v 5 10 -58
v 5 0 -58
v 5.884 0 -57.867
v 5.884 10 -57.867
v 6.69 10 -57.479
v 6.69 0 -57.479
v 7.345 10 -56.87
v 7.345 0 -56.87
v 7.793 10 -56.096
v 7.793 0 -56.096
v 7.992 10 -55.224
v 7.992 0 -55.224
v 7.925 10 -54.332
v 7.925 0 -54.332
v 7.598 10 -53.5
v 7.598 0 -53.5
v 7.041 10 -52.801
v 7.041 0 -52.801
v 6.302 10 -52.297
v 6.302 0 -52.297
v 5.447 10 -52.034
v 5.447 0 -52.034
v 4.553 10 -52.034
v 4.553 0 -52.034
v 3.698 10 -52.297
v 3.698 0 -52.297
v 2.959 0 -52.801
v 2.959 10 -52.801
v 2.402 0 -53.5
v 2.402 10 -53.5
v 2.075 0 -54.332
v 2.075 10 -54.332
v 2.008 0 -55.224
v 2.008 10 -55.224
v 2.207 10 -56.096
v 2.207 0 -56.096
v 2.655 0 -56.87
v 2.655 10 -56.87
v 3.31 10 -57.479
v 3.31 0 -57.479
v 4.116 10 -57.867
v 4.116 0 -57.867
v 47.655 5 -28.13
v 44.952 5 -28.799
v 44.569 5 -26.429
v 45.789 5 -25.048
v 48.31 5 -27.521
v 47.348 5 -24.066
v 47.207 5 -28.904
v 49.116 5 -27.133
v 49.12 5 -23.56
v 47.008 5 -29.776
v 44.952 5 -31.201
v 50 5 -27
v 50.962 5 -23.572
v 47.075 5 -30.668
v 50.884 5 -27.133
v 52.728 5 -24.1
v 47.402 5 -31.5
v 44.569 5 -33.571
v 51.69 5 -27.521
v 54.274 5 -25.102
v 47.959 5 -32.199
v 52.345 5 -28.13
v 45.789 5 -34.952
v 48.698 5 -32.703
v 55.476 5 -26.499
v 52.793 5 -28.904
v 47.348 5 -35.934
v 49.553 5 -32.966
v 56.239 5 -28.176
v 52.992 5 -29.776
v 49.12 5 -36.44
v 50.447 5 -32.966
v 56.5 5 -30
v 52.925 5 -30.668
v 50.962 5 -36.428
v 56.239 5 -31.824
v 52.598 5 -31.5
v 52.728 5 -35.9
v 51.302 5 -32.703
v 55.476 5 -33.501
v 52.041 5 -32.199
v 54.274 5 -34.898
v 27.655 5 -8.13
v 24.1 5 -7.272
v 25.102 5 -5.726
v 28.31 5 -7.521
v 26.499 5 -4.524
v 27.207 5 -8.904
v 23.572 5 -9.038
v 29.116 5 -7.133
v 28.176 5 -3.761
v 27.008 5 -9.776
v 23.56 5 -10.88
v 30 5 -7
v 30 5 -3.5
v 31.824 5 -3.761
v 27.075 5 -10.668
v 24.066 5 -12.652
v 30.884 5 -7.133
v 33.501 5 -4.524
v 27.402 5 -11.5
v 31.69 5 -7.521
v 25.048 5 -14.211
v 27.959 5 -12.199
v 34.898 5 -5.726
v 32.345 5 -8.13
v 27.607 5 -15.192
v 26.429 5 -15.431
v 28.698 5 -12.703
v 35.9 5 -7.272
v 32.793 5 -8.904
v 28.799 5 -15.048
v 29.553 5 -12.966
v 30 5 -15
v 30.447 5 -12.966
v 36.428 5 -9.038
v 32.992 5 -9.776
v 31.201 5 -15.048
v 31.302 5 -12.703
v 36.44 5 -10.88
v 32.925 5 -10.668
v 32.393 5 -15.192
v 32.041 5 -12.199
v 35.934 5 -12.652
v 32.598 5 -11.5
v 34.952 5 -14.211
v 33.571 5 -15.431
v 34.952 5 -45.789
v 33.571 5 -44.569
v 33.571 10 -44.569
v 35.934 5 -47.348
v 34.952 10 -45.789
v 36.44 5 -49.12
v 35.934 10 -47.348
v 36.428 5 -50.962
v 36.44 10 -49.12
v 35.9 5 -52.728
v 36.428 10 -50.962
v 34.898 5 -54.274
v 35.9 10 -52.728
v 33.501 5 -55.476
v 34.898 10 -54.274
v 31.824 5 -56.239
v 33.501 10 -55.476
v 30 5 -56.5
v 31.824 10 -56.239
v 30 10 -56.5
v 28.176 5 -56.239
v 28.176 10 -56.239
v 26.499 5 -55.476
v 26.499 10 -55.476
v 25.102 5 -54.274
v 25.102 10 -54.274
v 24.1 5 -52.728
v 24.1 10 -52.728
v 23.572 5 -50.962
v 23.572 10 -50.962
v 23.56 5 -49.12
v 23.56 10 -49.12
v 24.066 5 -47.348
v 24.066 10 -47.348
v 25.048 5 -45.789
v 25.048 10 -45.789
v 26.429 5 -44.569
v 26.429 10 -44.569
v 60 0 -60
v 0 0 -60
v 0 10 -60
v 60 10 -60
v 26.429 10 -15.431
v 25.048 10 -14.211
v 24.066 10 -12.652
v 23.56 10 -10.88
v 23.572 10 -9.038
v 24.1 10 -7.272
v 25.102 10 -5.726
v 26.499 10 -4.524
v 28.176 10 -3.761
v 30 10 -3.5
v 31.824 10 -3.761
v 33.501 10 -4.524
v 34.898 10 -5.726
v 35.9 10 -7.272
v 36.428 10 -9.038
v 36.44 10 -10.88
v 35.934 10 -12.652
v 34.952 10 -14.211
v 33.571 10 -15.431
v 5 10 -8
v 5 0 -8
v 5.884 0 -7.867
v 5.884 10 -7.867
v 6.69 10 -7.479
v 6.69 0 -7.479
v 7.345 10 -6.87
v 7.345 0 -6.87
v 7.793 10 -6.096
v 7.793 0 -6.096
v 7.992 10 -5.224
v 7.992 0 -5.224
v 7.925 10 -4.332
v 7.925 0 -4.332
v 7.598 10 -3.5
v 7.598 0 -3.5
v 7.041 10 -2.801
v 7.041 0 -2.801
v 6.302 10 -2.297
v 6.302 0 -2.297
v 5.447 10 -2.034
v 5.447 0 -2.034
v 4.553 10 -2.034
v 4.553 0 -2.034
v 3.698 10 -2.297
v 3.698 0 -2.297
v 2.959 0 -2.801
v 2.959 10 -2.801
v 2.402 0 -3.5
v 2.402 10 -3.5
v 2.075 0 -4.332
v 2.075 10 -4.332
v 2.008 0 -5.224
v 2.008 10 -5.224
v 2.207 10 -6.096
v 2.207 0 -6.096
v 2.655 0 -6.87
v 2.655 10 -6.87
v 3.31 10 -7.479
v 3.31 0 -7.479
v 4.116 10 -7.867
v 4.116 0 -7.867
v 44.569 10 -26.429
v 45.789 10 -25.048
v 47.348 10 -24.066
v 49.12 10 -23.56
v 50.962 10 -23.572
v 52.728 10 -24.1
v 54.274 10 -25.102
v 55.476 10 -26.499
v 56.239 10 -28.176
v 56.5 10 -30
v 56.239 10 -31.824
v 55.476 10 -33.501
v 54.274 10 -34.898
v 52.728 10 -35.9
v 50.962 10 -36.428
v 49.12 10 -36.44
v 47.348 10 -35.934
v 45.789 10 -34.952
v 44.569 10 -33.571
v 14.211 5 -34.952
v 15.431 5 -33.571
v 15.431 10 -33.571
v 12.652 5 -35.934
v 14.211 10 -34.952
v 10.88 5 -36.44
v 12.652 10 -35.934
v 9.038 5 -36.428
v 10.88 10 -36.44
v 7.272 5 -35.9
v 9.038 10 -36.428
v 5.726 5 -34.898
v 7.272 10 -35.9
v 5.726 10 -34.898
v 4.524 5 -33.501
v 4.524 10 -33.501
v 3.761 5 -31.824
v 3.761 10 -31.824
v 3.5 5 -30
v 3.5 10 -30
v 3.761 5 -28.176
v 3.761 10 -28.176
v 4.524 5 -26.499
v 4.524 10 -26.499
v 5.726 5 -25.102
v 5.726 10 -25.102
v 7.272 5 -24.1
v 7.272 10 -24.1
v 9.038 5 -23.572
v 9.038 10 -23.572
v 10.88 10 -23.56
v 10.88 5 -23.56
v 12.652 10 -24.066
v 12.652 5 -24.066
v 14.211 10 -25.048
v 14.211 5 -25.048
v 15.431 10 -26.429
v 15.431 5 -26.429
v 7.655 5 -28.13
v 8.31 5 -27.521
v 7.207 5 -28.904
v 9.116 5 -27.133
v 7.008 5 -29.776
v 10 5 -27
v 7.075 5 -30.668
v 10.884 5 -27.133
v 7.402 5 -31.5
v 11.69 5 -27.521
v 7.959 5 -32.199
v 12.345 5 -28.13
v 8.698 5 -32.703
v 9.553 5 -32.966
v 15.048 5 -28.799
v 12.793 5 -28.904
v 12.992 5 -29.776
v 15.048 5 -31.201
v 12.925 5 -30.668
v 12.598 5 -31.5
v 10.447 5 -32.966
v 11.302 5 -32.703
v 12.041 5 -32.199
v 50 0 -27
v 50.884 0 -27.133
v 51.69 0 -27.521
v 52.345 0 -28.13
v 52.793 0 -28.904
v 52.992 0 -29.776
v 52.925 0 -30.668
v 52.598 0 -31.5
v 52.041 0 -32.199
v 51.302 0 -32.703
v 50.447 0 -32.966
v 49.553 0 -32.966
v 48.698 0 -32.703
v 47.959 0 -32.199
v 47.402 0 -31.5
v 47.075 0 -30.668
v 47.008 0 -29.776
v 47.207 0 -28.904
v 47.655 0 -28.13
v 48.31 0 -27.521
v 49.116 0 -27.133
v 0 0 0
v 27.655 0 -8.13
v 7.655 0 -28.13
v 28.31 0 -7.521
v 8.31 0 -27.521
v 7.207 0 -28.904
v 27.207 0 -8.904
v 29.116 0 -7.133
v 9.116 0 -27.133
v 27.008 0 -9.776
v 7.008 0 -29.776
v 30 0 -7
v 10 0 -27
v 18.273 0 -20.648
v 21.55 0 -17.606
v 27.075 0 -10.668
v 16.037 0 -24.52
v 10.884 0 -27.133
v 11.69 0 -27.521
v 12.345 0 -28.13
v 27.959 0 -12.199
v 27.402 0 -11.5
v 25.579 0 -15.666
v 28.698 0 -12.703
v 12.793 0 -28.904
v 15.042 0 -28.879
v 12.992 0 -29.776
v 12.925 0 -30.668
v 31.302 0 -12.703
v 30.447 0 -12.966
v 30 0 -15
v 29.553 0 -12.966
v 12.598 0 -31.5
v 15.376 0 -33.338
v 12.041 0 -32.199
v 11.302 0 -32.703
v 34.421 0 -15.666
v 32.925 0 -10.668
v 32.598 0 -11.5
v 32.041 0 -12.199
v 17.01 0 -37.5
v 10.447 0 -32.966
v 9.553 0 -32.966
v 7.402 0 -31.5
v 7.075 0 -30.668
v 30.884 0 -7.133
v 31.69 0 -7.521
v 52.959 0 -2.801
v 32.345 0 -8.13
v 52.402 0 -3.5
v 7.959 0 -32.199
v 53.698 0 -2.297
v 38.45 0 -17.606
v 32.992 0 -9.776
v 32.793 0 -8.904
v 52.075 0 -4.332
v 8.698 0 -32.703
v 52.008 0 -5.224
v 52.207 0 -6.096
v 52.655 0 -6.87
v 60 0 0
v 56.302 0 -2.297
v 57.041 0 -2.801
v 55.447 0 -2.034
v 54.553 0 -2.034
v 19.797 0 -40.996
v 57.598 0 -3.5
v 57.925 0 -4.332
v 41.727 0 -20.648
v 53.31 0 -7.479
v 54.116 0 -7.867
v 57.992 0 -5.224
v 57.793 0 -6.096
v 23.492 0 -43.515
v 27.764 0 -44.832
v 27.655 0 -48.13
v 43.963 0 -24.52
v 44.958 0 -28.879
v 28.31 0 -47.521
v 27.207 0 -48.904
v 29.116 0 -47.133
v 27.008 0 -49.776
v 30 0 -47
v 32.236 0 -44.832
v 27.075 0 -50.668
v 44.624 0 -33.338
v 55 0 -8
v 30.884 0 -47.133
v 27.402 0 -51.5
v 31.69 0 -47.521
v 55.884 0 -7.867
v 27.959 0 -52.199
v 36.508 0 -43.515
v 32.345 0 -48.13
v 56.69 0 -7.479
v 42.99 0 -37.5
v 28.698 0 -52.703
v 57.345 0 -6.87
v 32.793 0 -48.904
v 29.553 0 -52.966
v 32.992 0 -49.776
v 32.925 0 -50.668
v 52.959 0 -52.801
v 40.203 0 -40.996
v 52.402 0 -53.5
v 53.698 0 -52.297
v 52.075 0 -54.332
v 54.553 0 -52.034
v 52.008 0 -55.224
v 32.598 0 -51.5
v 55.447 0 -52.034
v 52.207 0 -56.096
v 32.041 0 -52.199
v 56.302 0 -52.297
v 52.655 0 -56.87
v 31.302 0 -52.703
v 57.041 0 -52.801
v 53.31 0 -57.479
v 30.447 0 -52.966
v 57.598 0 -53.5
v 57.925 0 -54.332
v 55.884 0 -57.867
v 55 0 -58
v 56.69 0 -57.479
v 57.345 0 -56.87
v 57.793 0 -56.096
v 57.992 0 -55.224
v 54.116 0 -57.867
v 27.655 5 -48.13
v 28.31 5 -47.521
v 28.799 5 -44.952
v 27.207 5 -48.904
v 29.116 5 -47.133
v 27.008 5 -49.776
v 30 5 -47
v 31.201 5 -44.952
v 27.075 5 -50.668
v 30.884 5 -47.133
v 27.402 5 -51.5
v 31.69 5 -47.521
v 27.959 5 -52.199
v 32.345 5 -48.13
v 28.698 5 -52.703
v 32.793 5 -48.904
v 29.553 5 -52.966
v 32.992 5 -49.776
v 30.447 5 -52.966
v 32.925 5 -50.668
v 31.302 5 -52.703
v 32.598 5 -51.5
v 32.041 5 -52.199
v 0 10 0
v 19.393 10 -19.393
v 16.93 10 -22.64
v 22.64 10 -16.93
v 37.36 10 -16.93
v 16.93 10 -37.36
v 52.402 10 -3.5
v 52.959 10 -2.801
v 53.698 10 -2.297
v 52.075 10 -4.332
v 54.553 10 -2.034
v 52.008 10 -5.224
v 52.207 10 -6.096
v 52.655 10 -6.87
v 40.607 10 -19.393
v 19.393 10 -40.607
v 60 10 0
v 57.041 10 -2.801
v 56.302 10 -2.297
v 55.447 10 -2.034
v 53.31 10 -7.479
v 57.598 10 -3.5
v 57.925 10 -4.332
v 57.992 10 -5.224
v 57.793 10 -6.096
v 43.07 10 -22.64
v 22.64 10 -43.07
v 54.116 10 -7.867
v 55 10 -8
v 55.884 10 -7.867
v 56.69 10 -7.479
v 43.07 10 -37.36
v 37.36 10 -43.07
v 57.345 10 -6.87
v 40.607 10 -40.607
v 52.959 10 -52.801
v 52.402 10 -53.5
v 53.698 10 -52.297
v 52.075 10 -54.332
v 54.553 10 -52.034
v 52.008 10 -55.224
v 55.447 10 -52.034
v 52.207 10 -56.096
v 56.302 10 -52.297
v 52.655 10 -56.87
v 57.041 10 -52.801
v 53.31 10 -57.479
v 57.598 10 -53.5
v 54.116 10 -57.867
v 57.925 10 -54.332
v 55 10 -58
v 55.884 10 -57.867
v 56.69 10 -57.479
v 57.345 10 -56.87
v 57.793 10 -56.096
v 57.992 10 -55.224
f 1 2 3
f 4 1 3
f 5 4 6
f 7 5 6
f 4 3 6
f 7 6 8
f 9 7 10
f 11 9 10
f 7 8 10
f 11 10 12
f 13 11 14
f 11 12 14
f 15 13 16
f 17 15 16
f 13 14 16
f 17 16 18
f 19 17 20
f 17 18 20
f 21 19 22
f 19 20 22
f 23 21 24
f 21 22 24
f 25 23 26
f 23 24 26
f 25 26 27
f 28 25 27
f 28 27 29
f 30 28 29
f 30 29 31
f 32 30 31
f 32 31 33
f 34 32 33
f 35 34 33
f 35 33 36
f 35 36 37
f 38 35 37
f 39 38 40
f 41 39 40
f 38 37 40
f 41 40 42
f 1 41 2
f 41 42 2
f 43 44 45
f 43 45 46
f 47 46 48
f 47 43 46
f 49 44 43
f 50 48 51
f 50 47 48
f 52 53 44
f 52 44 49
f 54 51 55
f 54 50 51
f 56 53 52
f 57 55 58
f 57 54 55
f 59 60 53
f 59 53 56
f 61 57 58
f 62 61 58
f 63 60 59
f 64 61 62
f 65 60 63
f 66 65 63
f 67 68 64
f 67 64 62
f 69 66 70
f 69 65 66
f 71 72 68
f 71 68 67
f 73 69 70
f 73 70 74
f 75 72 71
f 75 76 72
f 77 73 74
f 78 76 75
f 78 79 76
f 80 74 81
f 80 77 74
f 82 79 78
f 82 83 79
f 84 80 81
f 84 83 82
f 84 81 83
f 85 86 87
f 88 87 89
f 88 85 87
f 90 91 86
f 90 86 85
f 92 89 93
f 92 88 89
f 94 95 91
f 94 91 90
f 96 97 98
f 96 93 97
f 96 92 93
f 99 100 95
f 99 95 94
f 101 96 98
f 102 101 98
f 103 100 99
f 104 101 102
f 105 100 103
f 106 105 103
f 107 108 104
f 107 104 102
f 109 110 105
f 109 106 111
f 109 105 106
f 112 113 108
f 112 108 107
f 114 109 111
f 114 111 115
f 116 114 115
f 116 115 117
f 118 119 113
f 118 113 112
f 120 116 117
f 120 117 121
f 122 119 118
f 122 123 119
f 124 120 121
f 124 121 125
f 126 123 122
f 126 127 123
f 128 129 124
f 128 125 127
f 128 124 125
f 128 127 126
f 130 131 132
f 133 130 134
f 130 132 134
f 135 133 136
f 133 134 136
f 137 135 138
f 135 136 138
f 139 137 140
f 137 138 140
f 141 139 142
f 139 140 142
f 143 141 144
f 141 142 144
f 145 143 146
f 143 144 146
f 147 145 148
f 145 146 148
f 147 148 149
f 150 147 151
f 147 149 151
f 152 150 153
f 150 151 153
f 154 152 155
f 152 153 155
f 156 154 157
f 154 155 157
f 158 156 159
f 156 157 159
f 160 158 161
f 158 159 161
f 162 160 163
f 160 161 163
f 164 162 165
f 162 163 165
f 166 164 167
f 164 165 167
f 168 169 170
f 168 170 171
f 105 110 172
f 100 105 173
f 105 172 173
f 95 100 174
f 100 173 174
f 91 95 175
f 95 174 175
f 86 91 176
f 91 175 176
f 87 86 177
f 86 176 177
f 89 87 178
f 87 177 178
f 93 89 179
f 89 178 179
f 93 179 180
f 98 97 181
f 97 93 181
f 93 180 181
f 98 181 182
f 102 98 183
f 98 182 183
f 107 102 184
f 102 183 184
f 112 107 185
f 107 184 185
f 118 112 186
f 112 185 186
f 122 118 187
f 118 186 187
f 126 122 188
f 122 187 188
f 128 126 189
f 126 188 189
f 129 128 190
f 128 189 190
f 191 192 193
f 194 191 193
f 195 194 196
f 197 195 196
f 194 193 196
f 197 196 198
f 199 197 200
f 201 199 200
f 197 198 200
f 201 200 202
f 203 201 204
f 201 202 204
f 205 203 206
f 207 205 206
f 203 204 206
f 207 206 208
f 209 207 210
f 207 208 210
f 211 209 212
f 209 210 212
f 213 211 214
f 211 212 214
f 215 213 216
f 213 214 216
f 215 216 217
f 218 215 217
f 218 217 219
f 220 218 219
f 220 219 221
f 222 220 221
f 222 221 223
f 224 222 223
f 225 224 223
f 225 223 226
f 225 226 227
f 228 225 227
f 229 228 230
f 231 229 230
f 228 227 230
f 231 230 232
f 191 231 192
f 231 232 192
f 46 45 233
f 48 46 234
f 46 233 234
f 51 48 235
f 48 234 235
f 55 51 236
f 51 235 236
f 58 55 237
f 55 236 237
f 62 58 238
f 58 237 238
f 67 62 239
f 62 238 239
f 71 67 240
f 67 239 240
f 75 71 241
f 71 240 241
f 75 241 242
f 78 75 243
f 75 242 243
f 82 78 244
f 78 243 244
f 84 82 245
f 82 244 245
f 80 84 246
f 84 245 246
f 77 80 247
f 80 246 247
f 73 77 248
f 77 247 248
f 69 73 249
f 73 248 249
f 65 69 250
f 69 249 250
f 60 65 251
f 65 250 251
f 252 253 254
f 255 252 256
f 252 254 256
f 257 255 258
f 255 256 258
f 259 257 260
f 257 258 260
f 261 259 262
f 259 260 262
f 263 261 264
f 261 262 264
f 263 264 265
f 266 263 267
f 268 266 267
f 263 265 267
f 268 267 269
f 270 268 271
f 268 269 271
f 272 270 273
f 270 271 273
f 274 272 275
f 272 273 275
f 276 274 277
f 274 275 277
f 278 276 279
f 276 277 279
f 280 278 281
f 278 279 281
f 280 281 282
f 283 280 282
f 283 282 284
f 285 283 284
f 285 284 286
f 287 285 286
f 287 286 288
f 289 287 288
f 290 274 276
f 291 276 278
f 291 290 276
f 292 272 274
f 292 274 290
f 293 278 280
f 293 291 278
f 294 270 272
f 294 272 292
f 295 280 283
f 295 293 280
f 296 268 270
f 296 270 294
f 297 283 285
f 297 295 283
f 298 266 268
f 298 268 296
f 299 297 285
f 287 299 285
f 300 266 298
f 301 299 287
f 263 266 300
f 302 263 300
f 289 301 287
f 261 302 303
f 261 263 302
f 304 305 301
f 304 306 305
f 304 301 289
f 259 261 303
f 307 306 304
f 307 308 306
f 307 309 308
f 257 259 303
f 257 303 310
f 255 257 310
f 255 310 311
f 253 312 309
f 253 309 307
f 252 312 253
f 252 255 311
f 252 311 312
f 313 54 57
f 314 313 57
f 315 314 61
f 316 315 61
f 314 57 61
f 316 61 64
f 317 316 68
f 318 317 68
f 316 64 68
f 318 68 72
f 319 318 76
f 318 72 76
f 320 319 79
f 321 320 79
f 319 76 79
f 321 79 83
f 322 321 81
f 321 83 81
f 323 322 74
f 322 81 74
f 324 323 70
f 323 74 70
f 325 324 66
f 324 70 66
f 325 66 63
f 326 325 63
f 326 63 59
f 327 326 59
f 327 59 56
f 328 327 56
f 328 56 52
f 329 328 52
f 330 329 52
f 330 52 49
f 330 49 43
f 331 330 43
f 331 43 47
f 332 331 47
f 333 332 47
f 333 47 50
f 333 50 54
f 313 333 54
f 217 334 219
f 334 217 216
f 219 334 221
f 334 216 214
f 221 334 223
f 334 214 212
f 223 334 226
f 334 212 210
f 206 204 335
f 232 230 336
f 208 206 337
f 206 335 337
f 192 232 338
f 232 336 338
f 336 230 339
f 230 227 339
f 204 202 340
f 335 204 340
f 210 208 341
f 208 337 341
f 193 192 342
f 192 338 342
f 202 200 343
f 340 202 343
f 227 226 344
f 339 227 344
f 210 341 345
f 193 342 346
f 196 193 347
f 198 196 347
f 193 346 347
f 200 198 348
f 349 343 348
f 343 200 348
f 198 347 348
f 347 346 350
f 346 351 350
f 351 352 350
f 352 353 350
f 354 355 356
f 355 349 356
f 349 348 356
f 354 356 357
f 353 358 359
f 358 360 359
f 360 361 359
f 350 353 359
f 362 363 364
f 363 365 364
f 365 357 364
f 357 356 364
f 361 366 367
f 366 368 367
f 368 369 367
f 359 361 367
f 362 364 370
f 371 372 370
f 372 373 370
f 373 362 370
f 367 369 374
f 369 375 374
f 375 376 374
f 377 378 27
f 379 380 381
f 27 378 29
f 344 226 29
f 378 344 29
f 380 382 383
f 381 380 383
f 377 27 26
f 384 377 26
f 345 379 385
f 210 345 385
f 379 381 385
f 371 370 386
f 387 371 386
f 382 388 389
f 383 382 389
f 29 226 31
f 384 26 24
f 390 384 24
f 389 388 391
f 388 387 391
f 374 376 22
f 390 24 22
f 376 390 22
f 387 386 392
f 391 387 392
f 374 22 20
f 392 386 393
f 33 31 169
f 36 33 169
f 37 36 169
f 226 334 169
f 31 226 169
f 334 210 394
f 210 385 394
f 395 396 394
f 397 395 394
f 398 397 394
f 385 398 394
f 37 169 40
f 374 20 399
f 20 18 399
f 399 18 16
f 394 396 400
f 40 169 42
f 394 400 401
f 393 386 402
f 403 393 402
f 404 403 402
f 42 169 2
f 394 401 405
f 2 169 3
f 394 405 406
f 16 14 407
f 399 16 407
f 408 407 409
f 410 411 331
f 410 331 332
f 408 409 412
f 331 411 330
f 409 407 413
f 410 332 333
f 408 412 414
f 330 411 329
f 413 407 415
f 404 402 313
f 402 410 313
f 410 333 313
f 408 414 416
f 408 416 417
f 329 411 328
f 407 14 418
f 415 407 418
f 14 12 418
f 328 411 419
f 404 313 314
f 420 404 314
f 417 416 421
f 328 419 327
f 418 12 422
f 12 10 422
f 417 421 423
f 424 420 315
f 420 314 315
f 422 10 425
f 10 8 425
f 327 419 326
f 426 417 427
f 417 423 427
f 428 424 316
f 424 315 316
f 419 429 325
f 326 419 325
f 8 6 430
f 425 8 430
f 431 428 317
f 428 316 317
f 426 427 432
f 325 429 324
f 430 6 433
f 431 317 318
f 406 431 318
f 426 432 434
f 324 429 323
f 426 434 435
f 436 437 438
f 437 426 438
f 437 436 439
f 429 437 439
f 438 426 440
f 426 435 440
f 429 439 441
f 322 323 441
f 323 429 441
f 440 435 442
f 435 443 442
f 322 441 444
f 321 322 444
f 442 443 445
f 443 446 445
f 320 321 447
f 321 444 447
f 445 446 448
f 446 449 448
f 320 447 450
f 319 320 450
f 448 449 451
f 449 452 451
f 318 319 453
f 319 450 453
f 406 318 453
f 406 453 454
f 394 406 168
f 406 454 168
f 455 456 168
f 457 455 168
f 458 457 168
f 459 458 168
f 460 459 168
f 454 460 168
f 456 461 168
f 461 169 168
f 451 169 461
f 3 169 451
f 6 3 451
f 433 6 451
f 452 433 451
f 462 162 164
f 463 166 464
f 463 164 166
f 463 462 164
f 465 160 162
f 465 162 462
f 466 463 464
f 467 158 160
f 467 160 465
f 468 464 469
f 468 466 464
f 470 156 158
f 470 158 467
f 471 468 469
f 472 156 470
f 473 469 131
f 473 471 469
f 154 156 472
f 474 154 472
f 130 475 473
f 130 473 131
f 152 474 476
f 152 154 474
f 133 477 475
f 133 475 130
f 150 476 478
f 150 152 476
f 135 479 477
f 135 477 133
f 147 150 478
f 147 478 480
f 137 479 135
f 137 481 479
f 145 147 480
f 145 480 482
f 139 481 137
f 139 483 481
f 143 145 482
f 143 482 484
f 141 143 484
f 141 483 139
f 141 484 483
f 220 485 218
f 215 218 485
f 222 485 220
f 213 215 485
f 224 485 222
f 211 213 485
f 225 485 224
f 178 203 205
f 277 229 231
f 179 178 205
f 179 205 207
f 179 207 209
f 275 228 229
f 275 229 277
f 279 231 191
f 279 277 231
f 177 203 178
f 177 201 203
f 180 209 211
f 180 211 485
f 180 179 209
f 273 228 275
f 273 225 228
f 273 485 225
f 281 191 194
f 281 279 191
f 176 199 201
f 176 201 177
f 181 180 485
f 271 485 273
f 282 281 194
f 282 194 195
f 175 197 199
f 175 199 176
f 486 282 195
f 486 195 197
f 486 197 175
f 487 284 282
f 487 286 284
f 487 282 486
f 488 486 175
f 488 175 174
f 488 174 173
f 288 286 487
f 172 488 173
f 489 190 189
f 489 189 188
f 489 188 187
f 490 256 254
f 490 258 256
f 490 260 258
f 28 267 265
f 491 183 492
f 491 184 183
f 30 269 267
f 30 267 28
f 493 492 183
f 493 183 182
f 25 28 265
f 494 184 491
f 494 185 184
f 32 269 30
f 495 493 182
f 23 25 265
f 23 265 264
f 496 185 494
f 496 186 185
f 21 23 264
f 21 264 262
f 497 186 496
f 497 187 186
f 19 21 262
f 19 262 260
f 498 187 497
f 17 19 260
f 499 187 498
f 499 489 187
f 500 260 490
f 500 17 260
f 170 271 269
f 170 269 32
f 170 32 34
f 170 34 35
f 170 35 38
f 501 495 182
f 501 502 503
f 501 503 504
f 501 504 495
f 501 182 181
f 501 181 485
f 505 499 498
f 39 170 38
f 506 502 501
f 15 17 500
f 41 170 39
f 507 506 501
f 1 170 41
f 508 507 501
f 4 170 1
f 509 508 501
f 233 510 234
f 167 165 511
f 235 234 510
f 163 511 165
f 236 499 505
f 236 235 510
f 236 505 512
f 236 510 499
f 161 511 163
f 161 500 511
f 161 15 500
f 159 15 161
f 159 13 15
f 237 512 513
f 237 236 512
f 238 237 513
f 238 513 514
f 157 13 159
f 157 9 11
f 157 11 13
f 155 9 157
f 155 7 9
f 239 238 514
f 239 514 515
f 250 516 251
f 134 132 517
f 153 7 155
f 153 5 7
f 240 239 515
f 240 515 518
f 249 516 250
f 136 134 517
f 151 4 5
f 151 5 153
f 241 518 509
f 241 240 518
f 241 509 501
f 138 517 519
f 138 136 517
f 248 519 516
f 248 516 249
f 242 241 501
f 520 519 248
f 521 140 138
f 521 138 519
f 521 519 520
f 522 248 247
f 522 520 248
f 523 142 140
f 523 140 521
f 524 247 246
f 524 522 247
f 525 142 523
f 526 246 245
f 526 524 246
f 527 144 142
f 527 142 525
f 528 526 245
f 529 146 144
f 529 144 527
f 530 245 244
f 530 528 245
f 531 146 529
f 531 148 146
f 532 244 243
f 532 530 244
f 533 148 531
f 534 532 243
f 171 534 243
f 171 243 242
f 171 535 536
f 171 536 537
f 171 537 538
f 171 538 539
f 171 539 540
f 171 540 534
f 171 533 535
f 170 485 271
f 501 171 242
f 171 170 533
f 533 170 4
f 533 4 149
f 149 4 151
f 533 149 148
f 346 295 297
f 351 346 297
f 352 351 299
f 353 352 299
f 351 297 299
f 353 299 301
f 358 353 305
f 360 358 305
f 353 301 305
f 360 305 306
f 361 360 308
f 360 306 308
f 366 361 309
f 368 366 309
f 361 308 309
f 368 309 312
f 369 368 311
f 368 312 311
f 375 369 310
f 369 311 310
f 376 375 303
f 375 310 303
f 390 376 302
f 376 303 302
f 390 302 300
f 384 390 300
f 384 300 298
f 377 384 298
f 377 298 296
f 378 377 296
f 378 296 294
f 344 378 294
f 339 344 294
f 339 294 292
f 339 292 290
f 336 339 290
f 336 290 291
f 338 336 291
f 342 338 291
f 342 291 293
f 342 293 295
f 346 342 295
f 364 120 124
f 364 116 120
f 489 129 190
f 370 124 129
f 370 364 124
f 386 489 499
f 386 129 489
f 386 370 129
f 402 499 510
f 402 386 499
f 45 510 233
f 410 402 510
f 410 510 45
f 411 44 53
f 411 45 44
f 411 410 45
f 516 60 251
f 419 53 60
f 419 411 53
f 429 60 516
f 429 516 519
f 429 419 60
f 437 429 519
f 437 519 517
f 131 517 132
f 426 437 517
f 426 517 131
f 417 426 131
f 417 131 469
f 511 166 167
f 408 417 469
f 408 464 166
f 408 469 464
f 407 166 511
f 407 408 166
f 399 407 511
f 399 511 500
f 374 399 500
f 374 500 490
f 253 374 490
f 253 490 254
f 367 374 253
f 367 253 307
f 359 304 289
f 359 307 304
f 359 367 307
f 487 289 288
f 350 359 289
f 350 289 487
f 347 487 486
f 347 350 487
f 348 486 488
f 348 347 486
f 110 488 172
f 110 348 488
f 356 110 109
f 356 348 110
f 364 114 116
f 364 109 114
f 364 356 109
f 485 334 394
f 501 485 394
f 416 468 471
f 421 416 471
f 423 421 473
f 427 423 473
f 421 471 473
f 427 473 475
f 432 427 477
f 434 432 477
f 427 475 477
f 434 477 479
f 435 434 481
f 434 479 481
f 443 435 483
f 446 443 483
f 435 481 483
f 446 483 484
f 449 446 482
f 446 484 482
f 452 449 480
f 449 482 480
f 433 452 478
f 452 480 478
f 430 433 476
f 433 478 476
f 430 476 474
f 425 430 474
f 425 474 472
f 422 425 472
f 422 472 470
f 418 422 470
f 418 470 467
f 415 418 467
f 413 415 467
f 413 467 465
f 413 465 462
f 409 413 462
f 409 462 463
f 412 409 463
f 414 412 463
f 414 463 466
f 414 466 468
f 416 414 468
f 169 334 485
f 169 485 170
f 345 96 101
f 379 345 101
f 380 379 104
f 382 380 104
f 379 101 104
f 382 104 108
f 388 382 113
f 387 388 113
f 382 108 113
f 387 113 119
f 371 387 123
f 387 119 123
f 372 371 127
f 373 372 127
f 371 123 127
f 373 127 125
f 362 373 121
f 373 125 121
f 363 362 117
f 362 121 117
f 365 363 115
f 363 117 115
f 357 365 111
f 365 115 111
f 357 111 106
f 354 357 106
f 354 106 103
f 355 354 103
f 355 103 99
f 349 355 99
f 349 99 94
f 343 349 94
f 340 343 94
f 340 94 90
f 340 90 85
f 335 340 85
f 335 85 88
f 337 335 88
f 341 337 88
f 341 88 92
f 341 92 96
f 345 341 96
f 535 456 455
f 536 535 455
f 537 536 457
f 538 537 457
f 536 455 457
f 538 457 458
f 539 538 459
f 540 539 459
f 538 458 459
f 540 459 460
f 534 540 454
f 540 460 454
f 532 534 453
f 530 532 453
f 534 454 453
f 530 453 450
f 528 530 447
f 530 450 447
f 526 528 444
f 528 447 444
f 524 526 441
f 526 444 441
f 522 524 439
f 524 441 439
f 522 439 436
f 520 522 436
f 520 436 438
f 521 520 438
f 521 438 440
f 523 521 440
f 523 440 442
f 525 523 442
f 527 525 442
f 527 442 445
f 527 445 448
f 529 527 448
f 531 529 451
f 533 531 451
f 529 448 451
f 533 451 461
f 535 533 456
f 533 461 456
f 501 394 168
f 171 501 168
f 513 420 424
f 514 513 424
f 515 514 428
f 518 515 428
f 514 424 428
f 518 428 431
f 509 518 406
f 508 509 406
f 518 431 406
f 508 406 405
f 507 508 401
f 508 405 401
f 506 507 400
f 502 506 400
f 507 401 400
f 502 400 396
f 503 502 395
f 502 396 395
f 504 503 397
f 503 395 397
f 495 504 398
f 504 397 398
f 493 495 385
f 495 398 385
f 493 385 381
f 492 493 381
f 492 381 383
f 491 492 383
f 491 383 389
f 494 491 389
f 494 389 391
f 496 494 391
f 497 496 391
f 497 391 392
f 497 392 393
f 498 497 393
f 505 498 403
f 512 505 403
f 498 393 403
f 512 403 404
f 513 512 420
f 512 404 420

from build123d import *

# Parameters (mm, degrees)
SKETCH1_W           = 60
SKETCH1_H           = 60
SKETCH1_R           = 15
BOSS_EXTRUDE1_DEPTH = 10
SKETCH2_R           = 3
CUT_EXTRUDE1_DEPTH  = 10
SKETCH3_R           = 6.5
CUT_EXTRUDE2_DEPTH  = 5
SKETCH4_R           = 3
CUT_EXTRUDE3_DEPTH  = 10


with BuildPart() as part:
    # Sketch1 → Boss-Extrude1 (new body)
    with BuildSketch(Plane(origin=(0, 0, 0), x_dir=(1, 0, 0), z_dir=(0, 1, 0))):
        with Locations((30, 30)):
            Rectangle(SKETCH1_W, SKETCH1_H)
        with Locations(Location((30, 30, 0), (0, 0, 270))):
            Circle(SKETCH1_R, mode=Mode.SUBTRACT)
    extrude(amount=BOSS_EXTRUDE1_DEPTH)

    # Sketch2 → Cut-Extrude1 (cut)
    with BuildSketch(Plane(origin=(0, 10, 0), x_dir=(1, 0, 0), z_dir=(0, 1, 0))):
        with Locations(Location((30, 50, 0), (0, 0, 270))):
            Circle(SKETCH2_R)
        with Locations(Location((50, 30, 0), (0, 0, 270))):
            Circle(SKETCH2_R)
        with Locations(Location((30, 10, 0), (0, 0, 270))):
            Circle(SKETCH2_R)
        with Locations(Location((10, 30, 0), (0, 0, 270))):
            Circle(SKETCH2_R)
    extrude(amount=-CUT_EXTRUDE1_DEPTH, mode=Mode.SUBTRACT)

    # Sketch3 → Cut-Extrude2 (cut)
    with BuildSketch(Plane(origin=(0, 10, 0), x_dir=(1, 0, 0), z_dir=(0, 1, 0))):
        with Locations((30, 50)):
            Circle(SKETCH3_R)
        with Locations((50, 30)):
            Circle(SKETCH3_R)
        with Locations((30, 10)):
            Circle(SKETCH3_R)
        with Locations((10, 30)):
            Circle(SKETCH3_R)
    extrude(amount=-CUT_EXTRUDE2_DEPTH, mode=Mode.SUBTRACT)

    # Sketch4 → Cut-Extrude3 (cut)
    with BuildSketch(Plane.XZ):
        with Locations(Location((5, -5, 0), (0, 0, 270))):
            Circle(SKETCH4_R)
        with Locations(Location((55, -5, 0), (0, 0, 270))):
            Circle(SKETCH4_R)
        with Locations(Location((55, -55, 0), (0, 0, 270))):
            Circle(SKETCH4_R)
        with Locations(Location((5, -55, 0), (0, 0, 270))):
            Circle(SKETCH4_R)
    extrude(amount=-CUT_EXTRUDE3_DEPTH, mode=Mode.SUBTRACT)


solid = part.part
